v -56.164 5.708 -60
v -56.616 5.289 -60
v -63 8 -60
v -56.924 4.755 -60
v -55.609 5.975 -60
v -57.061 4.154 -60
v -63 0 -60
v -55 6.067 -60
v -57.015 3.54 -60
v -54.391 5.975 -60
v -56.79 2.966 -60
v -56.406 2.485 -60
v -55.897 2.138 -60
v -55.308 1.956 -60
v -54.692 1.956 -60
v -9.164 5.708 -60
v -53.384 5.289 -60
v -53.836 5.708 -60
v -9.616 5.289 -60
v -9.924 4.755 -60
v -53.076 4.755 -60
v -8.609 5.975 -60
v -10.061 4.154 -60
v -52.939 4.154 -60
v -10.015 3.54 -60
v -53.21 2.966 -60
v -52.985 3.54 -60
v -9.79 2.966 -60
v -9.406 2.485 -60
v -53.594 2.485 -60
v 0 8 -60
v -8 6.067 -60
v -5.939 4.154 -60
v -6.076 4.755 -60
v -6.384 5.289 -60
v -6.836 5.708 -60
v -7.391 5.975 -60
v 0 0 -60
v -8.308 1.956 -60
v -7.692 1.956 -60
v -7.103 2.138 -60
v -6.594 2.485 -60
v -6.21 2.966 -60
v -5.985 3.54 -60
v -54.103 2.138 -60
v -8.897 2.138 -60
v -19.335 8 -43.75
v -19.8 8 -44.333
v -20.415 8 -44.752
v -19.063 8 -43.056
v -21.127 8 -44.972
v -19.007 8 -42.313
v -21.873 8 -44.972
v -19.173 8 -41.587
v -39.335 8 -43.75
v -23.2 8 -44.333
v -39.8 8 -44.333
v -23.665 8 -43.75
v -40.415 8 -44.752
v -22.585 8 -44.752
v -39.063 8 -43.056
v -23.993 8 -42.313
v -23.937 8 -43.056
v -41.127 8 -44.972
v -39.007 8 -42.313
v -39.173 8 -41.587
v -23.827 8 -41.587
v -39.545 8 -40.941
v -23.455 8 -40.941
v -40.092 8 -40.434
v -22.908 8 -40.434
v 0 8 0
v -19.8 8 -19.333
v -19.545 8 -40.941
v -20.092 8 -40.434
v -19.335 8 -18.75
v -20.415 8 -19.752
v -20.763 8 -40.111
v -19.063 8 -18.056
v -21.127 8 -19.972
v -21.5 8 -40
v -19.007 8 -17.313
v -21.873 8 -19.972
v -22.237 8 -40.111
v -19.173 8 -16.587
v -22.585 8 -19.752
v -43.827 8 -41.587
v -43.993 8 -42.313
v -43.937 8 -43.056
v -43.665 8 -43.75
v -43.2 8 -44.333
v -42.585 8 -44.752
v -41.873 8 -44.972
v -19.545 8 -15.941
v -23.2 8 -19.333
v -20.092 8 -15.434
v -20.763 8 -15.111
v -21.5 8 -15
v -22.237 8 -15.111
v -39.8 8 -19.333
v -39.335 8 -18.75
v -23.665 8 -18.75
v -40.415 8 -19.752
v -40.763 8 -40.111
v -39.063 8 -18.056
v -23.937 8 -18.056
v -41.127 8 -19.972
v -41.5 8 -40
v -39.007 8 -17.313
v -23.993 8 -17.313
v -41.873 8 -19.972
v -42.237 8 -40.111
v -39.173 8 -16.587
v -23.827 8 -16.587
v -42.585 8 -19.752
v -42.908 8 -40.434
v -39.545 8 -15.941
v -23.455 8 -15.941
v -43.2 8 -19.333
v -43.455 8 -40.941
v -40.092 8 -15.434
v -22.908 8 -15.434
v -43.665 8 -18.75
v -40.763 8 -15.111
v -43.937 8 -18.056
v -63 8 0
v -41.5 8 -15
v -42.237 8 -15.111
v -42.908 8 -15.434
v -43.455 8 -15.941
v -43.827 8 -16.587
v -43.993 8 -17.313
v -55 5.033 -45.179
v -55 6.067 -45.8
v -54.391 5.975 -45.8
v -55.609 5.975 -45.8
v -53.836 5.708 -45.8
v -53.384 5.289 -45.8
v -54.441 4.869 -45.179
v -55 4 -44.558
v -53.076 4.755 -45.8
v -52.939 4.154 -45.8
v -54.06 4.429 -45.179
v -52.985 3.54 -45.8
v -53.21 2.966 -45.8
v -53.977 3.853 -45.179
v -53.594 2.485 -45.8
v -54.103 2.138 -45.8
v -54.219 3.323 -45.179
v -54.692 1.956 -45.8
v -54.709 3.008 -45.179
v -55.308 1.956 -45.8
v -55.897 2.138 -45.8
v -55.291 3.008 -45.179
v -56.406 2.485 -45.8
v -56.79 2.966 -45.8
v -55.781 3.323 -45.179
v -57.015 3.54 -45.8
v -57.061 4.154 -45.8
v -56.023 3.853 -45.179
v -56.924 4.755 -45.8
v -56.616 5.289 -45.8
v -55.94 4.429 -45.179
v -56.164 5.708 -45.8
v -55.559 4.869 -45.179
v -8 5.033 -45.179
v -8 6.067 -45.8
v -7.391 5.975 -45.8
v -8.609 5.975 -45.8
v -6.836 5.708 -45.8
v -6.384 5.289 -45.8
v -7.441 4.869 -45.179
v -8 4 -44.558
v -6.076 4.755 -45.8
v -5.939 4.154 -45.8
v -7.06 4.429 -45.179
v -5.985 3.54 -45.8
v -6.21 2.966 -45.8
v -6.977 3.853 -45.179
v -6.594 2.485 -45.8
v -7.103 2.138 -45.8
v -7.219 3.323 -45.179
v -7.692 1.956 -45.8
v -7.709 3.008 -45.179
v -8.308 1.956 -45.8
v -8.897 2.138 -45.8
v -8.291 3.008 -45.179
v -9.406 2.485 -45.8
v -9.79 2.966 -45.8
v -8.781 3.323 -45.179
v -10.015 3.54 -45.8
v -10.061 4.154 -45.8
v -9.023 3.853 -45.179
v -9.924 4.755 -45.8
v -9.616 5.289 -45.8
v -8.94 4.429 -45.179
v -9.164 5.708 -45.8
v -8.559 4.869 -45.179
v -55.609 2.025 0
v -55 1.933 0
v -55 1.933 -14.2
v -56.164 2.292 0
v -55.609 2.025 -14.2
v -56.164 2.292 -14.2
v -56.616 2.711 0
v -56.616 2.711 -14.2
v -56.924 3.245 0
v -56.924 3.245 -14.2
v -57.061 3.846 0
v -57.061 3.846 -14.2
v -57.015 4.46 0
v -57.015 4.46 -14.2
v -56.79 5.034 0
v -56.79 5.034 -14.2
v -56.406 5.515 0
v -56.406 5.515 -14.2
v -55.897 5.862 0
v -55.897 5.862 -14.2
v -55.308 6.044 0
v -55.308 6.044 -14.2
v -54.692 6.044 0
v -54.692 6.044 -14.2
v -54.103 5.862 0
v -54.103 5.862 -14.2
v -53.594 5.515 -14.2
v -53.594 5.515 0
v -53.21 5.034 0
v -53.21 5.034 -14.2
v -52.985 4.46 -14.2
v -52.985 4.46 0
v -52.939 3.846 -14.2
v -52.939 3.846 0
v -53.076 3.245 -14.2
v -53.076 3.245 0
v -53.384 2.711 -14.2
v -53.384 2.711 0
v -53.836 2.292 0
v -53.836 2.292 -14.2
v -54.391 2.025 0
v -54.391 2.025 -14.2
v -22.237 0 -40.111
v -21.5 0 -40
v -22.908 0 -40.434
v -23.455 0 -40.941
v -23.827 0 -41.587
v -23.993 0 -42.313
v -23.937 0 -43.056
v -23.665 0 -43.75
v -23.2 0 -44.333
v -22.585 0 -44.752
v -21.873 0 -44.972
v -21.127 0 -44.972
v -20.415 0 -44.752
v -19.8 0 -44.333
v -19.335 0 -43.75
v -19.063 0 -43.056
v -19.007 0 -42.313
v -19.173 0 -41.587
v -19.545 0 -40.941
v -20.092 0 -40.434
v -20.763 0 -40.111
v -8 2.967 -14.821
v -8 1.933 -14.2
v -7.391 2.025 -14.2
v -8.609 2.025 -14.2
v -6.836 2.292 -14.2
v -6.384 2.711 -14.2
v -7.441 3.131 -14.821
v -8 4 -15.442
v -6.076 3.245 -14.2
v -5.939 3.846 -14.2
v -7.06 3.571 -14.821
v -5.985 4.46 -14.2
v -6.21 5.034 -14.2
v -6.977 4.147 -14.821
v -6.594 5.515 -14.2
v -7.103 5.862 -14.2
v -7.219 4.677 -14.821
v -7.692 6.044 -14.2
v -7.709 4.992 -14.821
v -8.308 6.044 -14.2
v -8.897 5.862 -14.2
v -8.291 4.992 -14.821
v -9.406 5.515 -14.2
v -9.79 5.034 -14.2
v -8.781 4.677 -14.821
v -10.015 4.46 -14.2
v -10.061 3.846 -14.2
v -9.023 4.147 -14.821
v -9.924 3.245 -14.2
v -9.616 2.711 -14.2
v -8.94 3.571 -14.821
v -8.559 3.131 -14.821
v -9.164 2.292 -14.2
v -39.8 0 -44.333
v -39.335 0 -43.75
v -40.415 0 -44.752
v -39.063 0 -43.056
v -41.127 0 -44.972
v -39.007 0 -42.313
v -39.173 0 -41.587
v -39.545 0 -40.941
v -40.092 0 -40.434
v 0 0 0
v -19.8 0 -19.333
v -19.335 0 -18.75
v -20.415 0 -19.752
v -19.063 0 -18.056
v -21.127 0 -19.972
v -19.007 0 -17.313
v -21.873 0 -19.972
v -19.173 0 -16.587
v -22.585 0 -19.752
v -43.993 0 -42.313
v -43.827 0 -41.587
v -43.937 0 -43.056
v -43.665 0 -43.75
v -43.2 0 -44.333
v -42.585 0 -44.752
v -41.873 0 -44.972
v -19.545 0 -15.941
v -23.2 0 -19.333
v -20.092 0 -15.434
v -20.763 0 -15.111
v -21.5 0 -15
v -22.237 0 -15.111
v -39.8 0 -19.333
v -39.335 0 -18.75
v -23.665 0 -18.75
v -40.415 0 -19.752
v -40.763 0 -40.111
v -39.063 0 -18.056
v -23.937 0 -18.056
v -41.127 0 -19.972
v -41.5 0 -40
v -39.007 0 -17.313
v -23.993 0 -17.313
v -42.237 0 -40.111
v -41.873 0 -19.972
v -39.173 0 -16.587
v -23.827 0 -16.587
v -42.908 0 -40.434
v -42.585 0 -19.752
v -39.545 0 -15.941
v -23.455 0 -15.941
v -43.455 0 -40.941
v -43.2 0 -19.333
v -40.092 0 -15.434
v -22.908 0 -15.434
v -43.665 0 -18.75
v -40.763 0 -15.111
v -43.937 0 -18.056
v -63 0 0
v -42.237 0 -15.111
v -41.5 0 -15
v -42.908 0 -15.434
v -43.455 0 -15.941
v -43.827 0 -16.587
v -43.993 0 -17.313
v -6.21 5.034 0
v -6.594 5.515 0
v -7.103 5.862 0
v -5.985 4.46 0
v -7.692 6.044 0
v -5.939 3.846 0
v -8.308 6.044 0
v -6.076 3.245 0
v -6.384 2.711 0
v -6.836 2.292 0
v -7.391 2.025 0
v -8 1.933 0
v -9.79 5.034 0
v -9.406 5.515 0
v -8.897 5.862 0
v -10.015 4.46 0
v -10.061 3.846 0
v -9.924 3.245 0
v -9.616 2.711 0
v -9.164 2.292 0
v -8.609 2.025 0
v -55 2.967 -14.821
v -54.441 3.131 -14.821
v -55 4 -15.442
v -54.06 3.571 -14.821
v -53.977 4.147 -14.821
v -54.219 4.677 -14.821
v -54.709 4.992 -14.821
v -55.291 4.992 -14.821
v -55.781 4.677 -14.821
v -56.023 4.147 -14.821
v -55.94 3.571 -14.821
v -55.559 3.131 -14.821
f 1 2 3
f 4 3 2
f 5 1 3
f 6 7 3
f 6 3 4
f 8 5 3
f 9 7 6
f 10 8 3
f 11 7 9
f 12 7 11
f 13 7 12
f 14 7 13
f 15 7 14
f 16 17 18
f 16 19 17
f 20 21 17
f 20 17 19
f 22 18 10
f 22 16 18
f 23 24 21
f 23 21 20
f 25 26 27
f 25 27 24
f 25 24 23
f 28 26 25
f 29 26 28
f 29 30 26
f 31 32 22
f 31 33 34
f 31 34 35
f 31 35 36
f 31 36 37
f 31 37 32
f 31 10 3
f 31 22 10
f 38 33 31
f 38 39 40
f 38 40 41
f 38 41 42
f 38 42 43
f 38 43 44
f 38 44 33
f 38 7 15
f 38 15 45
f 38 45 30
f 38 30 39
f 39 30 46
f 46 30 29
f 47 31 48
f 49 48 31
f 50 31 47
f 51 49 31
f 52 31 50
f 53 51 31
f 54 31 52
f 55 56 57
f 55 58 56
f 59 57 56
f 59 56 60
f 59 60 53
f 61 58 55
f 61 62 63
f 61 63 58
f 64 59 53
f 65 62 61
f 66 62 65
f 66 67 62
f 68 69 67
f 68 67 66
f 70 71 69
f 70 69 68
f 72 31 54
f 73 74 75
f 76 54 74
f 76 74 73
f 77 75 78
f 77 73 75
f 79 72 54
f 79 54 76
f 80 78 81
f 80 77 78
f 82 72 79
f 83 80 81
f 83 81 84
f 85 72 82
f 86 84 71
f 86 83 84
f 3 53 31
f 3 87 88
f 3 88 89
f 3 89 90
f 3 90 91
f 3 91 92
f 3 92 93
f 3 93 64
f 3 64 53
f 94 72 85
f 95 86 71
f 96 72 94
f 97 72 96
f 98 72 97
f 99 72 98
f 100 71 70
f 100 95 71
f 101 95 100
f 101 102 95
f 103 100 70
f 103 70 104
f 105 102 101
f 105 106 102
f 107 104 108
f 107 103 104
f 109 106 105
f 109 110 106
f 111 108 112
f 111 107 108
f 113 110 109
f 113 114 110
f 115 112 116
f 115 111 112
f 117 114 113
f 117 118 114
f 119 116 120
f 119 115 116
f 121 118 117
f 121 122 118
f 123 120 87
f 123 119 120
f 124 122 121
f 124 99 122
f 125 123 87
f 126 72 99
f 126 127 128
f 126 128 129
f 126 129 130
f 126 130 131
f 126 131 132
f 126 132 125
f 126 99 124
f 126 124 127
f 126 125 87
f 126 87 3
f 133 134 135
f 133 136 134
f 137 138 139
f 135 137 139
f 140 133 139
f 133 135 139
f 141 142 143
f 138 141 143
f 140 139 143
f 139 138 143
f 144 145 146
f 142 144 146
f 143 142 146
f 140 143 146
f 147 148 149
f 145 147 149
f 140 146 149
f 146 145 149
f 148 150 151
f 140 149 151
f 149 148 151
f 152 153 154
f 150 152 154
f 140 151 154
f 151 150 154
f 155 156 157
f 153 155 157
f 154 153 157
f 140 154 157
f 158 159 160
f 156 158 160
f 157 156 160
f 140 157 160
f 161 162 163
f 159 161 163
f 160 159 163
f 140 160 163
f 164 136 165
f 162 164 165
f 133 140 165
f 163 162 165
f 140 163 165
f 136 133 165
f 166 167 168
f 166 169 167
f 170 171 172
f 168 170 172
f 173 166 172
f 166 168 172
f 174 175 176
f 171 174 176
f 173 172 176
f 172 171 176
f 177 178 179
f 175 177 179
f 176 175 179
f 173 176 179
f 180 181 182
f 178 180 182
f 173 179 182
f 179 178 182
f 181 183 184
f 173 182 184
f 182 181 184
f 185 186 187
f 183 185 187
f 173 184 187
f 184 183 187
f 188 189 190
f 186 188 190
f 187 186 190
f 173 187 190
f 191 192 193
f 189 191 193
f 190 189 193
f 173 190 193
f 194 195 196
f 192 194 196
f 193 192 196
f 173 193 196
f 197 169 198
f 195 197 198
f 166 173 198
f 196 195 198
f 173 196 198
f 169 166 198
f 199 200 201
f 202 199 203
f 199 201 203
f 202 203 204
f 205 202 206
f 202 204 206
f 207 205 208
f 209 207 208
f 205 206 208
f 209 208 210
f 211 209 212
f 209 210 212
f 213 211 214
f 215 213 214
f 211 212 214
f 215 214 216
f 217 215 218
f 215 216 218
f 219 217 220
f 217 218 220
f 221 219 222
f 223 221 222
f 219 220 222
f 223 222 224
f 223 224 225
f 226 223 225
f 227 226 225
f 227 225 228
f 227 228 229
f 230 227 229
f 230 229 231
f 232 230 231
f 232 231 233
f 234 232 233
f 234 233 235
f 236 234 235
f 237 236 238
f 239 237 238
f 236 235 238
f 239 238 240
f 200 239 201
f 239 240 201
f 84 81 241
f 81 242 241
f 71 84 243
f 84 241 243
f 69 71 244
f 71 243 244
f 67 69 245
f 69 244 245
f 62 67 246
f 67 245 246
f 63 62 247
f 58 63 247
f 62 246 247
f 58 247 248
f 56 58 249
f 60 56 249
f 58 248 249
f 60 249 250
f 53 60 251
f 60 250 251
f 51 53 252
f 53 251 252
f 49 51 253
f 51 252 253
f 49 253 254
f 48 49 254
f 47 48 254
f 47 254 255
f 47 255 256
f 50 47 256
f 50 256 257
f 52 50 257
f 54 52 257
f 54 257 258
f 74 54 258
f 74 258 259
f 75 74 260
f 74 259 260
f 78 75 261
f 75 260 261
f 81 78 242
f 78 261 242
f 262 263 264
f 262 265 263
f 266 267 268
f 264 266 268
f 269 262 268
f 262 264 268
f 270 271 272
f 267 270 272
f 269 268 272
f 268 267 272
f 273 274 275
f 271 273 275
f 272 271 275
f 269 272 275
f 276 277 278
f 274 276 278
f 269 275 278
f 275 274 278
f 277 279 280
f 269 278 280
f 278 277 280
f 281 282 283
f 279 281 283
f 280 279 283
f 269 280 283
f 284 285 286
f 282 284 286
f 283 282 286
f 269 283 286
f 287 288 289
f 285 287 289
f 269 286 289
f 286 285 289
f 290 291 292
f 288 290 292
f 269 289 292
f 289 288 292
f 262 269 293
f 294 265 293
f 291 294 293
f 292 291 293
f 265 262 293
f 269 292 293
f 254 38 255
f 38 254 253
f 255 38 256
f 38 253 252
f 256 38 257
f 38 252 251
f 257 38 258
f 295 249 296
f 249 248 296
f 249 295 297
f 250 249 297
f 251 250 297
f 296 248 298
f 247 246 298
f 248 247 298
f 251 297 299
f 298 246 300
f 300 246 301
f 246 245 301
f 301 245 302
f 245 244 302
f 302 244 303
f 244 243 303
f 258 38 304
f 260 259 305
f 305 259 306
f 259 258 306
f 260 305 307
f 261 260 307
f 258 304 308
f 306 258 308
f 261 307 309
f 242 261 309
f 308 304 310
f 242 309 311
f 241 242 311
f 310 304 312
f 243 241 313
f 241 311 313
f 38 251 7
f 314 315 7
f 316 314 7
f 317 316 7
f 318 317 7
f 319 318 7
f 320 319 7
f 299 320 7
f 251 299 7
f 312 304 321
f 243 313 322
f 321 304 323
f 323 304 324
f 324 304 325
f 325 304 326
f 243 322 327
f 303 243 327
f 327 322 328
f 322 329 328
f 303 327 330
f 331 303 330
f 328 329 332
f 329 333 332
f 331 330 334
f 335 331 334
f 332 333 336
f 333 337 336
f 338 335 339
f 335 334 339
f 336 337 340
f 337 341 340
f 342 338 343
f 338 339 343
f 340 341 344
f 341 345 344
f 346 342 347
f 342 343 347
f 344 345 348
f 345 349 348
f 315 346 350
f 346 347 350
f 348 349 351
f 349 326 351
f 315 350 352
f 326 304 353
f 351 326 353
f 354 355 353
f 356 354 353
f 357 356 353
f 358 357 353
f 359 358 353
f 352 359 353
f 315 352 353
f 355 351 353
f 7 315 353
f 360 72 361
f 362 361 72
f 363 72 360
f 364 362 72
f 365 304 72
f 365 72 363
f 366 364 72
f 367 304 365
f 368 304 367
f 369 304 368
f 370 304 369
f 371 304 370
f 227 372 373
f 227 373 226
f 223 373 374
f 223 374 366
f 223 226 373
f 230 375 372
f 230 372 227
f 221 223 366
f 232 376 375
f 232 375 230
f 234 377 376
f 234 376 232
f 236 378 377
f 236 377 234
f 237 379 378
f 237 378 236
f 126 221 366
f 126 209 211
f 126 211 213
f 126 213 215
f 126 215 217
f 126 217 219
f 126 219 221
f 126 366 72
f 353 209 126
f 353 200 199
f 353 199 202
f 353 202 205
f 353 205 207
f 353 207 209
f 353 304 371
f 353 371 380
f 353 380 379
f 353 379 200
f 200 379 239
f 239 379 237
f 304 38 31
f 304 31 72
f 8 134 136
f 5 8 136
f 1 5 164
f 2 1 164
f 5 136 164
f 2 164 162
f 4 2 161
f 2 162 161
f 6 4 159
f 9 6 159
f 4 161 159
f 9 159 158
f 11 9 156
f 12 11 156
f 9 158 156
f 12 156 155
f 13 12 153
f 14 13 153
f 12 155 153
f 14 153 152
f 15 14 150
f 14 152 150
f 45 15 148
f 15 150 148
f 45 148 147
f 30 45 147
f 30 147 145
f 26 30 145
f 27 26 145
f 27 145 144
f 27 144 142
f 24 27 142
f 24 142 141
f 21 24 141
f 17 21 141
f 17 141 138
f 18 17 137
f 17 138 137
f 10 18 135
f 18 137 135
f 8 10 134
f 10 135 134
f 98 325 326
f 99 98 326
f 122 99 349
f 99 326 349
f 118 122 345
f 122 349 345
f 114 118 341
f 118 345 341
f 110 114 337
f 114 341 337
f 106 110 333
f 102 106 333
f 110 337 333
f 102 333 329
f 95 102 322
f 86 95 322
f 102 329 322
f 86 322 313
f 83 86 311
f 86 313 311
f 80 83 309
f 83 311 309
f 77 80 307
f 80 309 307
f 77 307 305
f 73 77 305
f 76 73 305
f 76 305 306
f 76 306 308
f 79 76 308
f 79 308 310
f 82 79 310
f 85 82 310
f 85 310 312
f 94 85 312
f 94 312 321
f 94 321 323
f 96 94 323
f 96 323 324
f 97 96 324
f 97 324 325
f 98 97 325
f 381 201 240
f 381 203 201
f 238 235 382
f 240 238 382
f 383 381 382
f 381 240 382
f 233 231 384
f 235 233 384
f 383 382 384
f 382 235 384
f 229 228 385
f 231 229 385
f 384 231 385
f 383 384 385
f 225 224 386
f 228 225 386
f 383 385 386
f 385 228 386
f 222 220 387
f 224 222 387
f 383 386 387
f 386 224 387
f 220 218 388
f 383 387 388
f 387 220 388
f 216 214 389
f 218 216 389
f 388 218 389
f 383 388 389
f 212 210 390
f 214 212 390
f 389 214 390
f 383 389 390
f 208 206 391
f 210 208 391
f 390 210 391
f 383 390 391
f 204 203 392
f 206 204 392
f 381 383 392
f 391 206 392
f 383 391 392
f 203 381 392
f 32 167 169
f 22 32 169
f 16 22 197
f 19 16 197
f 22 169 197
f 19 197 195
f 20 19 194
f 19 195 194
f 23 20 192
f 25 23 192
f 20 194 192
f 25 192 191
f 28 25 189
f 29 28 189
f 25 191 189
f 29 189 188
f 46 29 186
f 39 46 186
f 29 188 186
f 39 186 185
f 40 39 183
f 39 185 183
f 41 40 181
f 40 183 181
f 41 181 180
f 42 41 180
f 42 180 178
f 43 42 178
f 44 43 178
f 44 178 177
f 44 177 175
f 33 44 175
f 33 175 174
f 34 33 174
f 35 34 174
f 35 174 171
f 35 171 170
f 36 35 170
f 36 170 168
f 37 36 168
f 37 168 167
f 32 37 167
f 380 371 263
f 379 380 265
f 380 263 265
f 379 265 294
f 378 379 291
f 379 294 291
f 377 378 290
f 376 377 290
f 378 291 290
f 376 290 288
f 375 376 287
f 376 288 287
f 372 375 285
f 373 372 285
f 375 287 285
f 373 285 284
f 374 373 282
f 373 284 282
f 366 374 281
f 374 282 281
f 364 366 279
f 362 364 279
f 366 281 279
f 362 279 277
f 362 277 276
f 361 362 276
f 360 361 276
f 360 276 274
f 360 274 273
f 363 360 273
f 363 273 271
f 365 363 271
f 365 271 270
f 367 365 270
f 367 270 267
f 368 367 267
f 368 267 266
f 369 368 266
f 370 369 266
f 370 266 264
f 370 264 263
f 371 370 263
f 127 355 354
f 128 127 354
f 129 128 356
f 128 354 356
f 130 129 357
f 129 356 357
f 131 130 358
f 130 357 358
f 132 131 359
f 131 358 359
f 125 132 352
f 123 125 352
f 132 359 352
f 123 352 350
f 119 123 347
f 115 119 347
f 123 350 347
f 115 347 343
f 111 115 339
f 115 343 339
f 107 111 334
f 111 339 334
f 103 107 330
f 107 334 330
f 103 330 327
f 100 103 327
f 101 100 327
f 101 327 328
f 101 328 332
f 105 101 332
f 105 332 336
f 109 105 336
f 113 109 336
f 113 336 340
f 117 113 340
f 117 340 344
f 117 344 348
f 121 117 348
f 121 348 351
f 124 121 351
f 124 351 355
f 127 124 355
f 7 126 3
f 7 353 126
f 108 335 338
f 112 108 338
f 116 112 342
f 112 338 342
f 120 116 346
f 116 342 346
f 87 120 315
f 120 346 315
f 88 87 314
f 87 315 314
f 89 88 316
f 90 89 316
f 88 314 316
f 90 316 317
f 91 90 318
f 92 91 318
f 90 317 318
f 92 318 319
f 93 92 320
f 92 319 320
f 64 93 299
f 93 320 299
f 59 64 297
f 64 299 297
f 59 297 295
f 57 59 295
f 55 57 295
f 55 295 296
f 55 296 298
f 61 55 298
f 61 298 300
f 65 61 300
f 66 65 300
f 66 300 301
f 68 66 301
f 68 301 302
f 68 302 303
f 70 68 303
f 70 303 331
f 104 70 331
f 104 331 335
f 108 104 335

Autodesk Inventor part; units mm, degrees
ref_plane "YZ Plane" through (0, 0, 0) normal (1, 0, 0) x (0, 1, 0)
ref_plane "XZ Plane" through (0, 0, 0) normal (0, 1, 0) x (-1, 0, 0)
ref_plane "XY Plane" through (0, 0, 0) normal (0, 0, 1) x (1, 0, 0)
sketch "Sketch5" plane through (0, 0, 0) normal (0, 1, 0) x (-1, 0, 0)
  line L0 (0, 0) -> (63, 0)
  line L1 (63, 0) -> (63, -60)
  line L2 (63, -60) -> (0, -60)
  line L3 (0, -60) -> (0, 0)
  dimension "d68" = 63
  dimension "d69" = 60
extrude "Extrusion2" add sketch "Sketch5" along normal blind 8
sketch "Sketch6" plane through (0, 8, 0) normal (0, 1, 0) x (1, 0, 0)
  line L0 (-63, 60) -> (-63, 0) projected
  line L1 (0, 60) -> (-63, 60) projected
  point P0 (0, 0)
  point P1 (-41.5, 42.5)
  point P2 (-41.5, 17.5)
  point P3 (-21.5, 42.5)
  point P4 (-21.5, 17.5)
  dimension "d74" = 25
  dimension "d77" = 20
  dimension "d80" = 63
  dimension "d81" = 60
  dimension "d82" = 21.5
  dimension "d83" = 17.5
hole "Hole3" at (-41.5, 8, -42.5) at (-41.5, 8, -17.5) at (-21.5, 8, -42.5) at (-21.5, 8, -17.5) direction (0, -1, 0) diameter 5 end through all
sketch "Sketch7" plane through (-63, 0, 0) normal (0, 0, 1) x (1, 0, 0)
  line L0 (0, 0) -> (0, 8) projected
  line L1 (63, 0) -> (63, 8) projected
  point P0 (55, 4)
  point P1 (8, 4)
  point P2 (0, 4)
  dimension "d91" = 8
  dimension "d92" = 8
hole "Hole4" at (-8, 4, 0) at (-55, 4, 0) direction (0, 0, -1) diameter 4.134 depth 14.2 tip angle 118 thread size "M5x0.8" class "6H" standard "ISO Metric profile"
sketch "Sketch8" plane through (0, 0, -60) normal (0, 0, -1) x (-1, 0, 0)
  circle A0 centre (8, 4) radius 2.067 projected
  circle A1 centre (55, 4) radius 2.067 projected
  point P0 (0, 0)
hole "Hole5" at (-8, 4, -60) at (-55, 4, -60) direction (0, 0, 1) diameter 4.134 depth 14.2 tip angle 118 thread size "M5x0.8" class "6H" standard "ISO Metric profile"
equation "\"d82\" = -0.5 * d77 + 0.5 * d80"
equation "\"d83\" = -0.5 * d74 + 0.5 * d81"
equation "\"d89\" = Thickness"
equation "\"BendRadius\" = Thickness"
equation "\"BendReliefWidth\" = Thickness"
equation "\"BendReliefDepth\" = 0.5 * Thickness"
equation "\"TransitionRadius\" = BendRadius"
equation "\"JacobiRadiusSize\" = BendRadius"
equation "\"GapSize\" = Thickness"
equation "\"Thickness\" = 5"
properties part number "Traseira da caixa de sustentação" material "Aluminum 6061"
